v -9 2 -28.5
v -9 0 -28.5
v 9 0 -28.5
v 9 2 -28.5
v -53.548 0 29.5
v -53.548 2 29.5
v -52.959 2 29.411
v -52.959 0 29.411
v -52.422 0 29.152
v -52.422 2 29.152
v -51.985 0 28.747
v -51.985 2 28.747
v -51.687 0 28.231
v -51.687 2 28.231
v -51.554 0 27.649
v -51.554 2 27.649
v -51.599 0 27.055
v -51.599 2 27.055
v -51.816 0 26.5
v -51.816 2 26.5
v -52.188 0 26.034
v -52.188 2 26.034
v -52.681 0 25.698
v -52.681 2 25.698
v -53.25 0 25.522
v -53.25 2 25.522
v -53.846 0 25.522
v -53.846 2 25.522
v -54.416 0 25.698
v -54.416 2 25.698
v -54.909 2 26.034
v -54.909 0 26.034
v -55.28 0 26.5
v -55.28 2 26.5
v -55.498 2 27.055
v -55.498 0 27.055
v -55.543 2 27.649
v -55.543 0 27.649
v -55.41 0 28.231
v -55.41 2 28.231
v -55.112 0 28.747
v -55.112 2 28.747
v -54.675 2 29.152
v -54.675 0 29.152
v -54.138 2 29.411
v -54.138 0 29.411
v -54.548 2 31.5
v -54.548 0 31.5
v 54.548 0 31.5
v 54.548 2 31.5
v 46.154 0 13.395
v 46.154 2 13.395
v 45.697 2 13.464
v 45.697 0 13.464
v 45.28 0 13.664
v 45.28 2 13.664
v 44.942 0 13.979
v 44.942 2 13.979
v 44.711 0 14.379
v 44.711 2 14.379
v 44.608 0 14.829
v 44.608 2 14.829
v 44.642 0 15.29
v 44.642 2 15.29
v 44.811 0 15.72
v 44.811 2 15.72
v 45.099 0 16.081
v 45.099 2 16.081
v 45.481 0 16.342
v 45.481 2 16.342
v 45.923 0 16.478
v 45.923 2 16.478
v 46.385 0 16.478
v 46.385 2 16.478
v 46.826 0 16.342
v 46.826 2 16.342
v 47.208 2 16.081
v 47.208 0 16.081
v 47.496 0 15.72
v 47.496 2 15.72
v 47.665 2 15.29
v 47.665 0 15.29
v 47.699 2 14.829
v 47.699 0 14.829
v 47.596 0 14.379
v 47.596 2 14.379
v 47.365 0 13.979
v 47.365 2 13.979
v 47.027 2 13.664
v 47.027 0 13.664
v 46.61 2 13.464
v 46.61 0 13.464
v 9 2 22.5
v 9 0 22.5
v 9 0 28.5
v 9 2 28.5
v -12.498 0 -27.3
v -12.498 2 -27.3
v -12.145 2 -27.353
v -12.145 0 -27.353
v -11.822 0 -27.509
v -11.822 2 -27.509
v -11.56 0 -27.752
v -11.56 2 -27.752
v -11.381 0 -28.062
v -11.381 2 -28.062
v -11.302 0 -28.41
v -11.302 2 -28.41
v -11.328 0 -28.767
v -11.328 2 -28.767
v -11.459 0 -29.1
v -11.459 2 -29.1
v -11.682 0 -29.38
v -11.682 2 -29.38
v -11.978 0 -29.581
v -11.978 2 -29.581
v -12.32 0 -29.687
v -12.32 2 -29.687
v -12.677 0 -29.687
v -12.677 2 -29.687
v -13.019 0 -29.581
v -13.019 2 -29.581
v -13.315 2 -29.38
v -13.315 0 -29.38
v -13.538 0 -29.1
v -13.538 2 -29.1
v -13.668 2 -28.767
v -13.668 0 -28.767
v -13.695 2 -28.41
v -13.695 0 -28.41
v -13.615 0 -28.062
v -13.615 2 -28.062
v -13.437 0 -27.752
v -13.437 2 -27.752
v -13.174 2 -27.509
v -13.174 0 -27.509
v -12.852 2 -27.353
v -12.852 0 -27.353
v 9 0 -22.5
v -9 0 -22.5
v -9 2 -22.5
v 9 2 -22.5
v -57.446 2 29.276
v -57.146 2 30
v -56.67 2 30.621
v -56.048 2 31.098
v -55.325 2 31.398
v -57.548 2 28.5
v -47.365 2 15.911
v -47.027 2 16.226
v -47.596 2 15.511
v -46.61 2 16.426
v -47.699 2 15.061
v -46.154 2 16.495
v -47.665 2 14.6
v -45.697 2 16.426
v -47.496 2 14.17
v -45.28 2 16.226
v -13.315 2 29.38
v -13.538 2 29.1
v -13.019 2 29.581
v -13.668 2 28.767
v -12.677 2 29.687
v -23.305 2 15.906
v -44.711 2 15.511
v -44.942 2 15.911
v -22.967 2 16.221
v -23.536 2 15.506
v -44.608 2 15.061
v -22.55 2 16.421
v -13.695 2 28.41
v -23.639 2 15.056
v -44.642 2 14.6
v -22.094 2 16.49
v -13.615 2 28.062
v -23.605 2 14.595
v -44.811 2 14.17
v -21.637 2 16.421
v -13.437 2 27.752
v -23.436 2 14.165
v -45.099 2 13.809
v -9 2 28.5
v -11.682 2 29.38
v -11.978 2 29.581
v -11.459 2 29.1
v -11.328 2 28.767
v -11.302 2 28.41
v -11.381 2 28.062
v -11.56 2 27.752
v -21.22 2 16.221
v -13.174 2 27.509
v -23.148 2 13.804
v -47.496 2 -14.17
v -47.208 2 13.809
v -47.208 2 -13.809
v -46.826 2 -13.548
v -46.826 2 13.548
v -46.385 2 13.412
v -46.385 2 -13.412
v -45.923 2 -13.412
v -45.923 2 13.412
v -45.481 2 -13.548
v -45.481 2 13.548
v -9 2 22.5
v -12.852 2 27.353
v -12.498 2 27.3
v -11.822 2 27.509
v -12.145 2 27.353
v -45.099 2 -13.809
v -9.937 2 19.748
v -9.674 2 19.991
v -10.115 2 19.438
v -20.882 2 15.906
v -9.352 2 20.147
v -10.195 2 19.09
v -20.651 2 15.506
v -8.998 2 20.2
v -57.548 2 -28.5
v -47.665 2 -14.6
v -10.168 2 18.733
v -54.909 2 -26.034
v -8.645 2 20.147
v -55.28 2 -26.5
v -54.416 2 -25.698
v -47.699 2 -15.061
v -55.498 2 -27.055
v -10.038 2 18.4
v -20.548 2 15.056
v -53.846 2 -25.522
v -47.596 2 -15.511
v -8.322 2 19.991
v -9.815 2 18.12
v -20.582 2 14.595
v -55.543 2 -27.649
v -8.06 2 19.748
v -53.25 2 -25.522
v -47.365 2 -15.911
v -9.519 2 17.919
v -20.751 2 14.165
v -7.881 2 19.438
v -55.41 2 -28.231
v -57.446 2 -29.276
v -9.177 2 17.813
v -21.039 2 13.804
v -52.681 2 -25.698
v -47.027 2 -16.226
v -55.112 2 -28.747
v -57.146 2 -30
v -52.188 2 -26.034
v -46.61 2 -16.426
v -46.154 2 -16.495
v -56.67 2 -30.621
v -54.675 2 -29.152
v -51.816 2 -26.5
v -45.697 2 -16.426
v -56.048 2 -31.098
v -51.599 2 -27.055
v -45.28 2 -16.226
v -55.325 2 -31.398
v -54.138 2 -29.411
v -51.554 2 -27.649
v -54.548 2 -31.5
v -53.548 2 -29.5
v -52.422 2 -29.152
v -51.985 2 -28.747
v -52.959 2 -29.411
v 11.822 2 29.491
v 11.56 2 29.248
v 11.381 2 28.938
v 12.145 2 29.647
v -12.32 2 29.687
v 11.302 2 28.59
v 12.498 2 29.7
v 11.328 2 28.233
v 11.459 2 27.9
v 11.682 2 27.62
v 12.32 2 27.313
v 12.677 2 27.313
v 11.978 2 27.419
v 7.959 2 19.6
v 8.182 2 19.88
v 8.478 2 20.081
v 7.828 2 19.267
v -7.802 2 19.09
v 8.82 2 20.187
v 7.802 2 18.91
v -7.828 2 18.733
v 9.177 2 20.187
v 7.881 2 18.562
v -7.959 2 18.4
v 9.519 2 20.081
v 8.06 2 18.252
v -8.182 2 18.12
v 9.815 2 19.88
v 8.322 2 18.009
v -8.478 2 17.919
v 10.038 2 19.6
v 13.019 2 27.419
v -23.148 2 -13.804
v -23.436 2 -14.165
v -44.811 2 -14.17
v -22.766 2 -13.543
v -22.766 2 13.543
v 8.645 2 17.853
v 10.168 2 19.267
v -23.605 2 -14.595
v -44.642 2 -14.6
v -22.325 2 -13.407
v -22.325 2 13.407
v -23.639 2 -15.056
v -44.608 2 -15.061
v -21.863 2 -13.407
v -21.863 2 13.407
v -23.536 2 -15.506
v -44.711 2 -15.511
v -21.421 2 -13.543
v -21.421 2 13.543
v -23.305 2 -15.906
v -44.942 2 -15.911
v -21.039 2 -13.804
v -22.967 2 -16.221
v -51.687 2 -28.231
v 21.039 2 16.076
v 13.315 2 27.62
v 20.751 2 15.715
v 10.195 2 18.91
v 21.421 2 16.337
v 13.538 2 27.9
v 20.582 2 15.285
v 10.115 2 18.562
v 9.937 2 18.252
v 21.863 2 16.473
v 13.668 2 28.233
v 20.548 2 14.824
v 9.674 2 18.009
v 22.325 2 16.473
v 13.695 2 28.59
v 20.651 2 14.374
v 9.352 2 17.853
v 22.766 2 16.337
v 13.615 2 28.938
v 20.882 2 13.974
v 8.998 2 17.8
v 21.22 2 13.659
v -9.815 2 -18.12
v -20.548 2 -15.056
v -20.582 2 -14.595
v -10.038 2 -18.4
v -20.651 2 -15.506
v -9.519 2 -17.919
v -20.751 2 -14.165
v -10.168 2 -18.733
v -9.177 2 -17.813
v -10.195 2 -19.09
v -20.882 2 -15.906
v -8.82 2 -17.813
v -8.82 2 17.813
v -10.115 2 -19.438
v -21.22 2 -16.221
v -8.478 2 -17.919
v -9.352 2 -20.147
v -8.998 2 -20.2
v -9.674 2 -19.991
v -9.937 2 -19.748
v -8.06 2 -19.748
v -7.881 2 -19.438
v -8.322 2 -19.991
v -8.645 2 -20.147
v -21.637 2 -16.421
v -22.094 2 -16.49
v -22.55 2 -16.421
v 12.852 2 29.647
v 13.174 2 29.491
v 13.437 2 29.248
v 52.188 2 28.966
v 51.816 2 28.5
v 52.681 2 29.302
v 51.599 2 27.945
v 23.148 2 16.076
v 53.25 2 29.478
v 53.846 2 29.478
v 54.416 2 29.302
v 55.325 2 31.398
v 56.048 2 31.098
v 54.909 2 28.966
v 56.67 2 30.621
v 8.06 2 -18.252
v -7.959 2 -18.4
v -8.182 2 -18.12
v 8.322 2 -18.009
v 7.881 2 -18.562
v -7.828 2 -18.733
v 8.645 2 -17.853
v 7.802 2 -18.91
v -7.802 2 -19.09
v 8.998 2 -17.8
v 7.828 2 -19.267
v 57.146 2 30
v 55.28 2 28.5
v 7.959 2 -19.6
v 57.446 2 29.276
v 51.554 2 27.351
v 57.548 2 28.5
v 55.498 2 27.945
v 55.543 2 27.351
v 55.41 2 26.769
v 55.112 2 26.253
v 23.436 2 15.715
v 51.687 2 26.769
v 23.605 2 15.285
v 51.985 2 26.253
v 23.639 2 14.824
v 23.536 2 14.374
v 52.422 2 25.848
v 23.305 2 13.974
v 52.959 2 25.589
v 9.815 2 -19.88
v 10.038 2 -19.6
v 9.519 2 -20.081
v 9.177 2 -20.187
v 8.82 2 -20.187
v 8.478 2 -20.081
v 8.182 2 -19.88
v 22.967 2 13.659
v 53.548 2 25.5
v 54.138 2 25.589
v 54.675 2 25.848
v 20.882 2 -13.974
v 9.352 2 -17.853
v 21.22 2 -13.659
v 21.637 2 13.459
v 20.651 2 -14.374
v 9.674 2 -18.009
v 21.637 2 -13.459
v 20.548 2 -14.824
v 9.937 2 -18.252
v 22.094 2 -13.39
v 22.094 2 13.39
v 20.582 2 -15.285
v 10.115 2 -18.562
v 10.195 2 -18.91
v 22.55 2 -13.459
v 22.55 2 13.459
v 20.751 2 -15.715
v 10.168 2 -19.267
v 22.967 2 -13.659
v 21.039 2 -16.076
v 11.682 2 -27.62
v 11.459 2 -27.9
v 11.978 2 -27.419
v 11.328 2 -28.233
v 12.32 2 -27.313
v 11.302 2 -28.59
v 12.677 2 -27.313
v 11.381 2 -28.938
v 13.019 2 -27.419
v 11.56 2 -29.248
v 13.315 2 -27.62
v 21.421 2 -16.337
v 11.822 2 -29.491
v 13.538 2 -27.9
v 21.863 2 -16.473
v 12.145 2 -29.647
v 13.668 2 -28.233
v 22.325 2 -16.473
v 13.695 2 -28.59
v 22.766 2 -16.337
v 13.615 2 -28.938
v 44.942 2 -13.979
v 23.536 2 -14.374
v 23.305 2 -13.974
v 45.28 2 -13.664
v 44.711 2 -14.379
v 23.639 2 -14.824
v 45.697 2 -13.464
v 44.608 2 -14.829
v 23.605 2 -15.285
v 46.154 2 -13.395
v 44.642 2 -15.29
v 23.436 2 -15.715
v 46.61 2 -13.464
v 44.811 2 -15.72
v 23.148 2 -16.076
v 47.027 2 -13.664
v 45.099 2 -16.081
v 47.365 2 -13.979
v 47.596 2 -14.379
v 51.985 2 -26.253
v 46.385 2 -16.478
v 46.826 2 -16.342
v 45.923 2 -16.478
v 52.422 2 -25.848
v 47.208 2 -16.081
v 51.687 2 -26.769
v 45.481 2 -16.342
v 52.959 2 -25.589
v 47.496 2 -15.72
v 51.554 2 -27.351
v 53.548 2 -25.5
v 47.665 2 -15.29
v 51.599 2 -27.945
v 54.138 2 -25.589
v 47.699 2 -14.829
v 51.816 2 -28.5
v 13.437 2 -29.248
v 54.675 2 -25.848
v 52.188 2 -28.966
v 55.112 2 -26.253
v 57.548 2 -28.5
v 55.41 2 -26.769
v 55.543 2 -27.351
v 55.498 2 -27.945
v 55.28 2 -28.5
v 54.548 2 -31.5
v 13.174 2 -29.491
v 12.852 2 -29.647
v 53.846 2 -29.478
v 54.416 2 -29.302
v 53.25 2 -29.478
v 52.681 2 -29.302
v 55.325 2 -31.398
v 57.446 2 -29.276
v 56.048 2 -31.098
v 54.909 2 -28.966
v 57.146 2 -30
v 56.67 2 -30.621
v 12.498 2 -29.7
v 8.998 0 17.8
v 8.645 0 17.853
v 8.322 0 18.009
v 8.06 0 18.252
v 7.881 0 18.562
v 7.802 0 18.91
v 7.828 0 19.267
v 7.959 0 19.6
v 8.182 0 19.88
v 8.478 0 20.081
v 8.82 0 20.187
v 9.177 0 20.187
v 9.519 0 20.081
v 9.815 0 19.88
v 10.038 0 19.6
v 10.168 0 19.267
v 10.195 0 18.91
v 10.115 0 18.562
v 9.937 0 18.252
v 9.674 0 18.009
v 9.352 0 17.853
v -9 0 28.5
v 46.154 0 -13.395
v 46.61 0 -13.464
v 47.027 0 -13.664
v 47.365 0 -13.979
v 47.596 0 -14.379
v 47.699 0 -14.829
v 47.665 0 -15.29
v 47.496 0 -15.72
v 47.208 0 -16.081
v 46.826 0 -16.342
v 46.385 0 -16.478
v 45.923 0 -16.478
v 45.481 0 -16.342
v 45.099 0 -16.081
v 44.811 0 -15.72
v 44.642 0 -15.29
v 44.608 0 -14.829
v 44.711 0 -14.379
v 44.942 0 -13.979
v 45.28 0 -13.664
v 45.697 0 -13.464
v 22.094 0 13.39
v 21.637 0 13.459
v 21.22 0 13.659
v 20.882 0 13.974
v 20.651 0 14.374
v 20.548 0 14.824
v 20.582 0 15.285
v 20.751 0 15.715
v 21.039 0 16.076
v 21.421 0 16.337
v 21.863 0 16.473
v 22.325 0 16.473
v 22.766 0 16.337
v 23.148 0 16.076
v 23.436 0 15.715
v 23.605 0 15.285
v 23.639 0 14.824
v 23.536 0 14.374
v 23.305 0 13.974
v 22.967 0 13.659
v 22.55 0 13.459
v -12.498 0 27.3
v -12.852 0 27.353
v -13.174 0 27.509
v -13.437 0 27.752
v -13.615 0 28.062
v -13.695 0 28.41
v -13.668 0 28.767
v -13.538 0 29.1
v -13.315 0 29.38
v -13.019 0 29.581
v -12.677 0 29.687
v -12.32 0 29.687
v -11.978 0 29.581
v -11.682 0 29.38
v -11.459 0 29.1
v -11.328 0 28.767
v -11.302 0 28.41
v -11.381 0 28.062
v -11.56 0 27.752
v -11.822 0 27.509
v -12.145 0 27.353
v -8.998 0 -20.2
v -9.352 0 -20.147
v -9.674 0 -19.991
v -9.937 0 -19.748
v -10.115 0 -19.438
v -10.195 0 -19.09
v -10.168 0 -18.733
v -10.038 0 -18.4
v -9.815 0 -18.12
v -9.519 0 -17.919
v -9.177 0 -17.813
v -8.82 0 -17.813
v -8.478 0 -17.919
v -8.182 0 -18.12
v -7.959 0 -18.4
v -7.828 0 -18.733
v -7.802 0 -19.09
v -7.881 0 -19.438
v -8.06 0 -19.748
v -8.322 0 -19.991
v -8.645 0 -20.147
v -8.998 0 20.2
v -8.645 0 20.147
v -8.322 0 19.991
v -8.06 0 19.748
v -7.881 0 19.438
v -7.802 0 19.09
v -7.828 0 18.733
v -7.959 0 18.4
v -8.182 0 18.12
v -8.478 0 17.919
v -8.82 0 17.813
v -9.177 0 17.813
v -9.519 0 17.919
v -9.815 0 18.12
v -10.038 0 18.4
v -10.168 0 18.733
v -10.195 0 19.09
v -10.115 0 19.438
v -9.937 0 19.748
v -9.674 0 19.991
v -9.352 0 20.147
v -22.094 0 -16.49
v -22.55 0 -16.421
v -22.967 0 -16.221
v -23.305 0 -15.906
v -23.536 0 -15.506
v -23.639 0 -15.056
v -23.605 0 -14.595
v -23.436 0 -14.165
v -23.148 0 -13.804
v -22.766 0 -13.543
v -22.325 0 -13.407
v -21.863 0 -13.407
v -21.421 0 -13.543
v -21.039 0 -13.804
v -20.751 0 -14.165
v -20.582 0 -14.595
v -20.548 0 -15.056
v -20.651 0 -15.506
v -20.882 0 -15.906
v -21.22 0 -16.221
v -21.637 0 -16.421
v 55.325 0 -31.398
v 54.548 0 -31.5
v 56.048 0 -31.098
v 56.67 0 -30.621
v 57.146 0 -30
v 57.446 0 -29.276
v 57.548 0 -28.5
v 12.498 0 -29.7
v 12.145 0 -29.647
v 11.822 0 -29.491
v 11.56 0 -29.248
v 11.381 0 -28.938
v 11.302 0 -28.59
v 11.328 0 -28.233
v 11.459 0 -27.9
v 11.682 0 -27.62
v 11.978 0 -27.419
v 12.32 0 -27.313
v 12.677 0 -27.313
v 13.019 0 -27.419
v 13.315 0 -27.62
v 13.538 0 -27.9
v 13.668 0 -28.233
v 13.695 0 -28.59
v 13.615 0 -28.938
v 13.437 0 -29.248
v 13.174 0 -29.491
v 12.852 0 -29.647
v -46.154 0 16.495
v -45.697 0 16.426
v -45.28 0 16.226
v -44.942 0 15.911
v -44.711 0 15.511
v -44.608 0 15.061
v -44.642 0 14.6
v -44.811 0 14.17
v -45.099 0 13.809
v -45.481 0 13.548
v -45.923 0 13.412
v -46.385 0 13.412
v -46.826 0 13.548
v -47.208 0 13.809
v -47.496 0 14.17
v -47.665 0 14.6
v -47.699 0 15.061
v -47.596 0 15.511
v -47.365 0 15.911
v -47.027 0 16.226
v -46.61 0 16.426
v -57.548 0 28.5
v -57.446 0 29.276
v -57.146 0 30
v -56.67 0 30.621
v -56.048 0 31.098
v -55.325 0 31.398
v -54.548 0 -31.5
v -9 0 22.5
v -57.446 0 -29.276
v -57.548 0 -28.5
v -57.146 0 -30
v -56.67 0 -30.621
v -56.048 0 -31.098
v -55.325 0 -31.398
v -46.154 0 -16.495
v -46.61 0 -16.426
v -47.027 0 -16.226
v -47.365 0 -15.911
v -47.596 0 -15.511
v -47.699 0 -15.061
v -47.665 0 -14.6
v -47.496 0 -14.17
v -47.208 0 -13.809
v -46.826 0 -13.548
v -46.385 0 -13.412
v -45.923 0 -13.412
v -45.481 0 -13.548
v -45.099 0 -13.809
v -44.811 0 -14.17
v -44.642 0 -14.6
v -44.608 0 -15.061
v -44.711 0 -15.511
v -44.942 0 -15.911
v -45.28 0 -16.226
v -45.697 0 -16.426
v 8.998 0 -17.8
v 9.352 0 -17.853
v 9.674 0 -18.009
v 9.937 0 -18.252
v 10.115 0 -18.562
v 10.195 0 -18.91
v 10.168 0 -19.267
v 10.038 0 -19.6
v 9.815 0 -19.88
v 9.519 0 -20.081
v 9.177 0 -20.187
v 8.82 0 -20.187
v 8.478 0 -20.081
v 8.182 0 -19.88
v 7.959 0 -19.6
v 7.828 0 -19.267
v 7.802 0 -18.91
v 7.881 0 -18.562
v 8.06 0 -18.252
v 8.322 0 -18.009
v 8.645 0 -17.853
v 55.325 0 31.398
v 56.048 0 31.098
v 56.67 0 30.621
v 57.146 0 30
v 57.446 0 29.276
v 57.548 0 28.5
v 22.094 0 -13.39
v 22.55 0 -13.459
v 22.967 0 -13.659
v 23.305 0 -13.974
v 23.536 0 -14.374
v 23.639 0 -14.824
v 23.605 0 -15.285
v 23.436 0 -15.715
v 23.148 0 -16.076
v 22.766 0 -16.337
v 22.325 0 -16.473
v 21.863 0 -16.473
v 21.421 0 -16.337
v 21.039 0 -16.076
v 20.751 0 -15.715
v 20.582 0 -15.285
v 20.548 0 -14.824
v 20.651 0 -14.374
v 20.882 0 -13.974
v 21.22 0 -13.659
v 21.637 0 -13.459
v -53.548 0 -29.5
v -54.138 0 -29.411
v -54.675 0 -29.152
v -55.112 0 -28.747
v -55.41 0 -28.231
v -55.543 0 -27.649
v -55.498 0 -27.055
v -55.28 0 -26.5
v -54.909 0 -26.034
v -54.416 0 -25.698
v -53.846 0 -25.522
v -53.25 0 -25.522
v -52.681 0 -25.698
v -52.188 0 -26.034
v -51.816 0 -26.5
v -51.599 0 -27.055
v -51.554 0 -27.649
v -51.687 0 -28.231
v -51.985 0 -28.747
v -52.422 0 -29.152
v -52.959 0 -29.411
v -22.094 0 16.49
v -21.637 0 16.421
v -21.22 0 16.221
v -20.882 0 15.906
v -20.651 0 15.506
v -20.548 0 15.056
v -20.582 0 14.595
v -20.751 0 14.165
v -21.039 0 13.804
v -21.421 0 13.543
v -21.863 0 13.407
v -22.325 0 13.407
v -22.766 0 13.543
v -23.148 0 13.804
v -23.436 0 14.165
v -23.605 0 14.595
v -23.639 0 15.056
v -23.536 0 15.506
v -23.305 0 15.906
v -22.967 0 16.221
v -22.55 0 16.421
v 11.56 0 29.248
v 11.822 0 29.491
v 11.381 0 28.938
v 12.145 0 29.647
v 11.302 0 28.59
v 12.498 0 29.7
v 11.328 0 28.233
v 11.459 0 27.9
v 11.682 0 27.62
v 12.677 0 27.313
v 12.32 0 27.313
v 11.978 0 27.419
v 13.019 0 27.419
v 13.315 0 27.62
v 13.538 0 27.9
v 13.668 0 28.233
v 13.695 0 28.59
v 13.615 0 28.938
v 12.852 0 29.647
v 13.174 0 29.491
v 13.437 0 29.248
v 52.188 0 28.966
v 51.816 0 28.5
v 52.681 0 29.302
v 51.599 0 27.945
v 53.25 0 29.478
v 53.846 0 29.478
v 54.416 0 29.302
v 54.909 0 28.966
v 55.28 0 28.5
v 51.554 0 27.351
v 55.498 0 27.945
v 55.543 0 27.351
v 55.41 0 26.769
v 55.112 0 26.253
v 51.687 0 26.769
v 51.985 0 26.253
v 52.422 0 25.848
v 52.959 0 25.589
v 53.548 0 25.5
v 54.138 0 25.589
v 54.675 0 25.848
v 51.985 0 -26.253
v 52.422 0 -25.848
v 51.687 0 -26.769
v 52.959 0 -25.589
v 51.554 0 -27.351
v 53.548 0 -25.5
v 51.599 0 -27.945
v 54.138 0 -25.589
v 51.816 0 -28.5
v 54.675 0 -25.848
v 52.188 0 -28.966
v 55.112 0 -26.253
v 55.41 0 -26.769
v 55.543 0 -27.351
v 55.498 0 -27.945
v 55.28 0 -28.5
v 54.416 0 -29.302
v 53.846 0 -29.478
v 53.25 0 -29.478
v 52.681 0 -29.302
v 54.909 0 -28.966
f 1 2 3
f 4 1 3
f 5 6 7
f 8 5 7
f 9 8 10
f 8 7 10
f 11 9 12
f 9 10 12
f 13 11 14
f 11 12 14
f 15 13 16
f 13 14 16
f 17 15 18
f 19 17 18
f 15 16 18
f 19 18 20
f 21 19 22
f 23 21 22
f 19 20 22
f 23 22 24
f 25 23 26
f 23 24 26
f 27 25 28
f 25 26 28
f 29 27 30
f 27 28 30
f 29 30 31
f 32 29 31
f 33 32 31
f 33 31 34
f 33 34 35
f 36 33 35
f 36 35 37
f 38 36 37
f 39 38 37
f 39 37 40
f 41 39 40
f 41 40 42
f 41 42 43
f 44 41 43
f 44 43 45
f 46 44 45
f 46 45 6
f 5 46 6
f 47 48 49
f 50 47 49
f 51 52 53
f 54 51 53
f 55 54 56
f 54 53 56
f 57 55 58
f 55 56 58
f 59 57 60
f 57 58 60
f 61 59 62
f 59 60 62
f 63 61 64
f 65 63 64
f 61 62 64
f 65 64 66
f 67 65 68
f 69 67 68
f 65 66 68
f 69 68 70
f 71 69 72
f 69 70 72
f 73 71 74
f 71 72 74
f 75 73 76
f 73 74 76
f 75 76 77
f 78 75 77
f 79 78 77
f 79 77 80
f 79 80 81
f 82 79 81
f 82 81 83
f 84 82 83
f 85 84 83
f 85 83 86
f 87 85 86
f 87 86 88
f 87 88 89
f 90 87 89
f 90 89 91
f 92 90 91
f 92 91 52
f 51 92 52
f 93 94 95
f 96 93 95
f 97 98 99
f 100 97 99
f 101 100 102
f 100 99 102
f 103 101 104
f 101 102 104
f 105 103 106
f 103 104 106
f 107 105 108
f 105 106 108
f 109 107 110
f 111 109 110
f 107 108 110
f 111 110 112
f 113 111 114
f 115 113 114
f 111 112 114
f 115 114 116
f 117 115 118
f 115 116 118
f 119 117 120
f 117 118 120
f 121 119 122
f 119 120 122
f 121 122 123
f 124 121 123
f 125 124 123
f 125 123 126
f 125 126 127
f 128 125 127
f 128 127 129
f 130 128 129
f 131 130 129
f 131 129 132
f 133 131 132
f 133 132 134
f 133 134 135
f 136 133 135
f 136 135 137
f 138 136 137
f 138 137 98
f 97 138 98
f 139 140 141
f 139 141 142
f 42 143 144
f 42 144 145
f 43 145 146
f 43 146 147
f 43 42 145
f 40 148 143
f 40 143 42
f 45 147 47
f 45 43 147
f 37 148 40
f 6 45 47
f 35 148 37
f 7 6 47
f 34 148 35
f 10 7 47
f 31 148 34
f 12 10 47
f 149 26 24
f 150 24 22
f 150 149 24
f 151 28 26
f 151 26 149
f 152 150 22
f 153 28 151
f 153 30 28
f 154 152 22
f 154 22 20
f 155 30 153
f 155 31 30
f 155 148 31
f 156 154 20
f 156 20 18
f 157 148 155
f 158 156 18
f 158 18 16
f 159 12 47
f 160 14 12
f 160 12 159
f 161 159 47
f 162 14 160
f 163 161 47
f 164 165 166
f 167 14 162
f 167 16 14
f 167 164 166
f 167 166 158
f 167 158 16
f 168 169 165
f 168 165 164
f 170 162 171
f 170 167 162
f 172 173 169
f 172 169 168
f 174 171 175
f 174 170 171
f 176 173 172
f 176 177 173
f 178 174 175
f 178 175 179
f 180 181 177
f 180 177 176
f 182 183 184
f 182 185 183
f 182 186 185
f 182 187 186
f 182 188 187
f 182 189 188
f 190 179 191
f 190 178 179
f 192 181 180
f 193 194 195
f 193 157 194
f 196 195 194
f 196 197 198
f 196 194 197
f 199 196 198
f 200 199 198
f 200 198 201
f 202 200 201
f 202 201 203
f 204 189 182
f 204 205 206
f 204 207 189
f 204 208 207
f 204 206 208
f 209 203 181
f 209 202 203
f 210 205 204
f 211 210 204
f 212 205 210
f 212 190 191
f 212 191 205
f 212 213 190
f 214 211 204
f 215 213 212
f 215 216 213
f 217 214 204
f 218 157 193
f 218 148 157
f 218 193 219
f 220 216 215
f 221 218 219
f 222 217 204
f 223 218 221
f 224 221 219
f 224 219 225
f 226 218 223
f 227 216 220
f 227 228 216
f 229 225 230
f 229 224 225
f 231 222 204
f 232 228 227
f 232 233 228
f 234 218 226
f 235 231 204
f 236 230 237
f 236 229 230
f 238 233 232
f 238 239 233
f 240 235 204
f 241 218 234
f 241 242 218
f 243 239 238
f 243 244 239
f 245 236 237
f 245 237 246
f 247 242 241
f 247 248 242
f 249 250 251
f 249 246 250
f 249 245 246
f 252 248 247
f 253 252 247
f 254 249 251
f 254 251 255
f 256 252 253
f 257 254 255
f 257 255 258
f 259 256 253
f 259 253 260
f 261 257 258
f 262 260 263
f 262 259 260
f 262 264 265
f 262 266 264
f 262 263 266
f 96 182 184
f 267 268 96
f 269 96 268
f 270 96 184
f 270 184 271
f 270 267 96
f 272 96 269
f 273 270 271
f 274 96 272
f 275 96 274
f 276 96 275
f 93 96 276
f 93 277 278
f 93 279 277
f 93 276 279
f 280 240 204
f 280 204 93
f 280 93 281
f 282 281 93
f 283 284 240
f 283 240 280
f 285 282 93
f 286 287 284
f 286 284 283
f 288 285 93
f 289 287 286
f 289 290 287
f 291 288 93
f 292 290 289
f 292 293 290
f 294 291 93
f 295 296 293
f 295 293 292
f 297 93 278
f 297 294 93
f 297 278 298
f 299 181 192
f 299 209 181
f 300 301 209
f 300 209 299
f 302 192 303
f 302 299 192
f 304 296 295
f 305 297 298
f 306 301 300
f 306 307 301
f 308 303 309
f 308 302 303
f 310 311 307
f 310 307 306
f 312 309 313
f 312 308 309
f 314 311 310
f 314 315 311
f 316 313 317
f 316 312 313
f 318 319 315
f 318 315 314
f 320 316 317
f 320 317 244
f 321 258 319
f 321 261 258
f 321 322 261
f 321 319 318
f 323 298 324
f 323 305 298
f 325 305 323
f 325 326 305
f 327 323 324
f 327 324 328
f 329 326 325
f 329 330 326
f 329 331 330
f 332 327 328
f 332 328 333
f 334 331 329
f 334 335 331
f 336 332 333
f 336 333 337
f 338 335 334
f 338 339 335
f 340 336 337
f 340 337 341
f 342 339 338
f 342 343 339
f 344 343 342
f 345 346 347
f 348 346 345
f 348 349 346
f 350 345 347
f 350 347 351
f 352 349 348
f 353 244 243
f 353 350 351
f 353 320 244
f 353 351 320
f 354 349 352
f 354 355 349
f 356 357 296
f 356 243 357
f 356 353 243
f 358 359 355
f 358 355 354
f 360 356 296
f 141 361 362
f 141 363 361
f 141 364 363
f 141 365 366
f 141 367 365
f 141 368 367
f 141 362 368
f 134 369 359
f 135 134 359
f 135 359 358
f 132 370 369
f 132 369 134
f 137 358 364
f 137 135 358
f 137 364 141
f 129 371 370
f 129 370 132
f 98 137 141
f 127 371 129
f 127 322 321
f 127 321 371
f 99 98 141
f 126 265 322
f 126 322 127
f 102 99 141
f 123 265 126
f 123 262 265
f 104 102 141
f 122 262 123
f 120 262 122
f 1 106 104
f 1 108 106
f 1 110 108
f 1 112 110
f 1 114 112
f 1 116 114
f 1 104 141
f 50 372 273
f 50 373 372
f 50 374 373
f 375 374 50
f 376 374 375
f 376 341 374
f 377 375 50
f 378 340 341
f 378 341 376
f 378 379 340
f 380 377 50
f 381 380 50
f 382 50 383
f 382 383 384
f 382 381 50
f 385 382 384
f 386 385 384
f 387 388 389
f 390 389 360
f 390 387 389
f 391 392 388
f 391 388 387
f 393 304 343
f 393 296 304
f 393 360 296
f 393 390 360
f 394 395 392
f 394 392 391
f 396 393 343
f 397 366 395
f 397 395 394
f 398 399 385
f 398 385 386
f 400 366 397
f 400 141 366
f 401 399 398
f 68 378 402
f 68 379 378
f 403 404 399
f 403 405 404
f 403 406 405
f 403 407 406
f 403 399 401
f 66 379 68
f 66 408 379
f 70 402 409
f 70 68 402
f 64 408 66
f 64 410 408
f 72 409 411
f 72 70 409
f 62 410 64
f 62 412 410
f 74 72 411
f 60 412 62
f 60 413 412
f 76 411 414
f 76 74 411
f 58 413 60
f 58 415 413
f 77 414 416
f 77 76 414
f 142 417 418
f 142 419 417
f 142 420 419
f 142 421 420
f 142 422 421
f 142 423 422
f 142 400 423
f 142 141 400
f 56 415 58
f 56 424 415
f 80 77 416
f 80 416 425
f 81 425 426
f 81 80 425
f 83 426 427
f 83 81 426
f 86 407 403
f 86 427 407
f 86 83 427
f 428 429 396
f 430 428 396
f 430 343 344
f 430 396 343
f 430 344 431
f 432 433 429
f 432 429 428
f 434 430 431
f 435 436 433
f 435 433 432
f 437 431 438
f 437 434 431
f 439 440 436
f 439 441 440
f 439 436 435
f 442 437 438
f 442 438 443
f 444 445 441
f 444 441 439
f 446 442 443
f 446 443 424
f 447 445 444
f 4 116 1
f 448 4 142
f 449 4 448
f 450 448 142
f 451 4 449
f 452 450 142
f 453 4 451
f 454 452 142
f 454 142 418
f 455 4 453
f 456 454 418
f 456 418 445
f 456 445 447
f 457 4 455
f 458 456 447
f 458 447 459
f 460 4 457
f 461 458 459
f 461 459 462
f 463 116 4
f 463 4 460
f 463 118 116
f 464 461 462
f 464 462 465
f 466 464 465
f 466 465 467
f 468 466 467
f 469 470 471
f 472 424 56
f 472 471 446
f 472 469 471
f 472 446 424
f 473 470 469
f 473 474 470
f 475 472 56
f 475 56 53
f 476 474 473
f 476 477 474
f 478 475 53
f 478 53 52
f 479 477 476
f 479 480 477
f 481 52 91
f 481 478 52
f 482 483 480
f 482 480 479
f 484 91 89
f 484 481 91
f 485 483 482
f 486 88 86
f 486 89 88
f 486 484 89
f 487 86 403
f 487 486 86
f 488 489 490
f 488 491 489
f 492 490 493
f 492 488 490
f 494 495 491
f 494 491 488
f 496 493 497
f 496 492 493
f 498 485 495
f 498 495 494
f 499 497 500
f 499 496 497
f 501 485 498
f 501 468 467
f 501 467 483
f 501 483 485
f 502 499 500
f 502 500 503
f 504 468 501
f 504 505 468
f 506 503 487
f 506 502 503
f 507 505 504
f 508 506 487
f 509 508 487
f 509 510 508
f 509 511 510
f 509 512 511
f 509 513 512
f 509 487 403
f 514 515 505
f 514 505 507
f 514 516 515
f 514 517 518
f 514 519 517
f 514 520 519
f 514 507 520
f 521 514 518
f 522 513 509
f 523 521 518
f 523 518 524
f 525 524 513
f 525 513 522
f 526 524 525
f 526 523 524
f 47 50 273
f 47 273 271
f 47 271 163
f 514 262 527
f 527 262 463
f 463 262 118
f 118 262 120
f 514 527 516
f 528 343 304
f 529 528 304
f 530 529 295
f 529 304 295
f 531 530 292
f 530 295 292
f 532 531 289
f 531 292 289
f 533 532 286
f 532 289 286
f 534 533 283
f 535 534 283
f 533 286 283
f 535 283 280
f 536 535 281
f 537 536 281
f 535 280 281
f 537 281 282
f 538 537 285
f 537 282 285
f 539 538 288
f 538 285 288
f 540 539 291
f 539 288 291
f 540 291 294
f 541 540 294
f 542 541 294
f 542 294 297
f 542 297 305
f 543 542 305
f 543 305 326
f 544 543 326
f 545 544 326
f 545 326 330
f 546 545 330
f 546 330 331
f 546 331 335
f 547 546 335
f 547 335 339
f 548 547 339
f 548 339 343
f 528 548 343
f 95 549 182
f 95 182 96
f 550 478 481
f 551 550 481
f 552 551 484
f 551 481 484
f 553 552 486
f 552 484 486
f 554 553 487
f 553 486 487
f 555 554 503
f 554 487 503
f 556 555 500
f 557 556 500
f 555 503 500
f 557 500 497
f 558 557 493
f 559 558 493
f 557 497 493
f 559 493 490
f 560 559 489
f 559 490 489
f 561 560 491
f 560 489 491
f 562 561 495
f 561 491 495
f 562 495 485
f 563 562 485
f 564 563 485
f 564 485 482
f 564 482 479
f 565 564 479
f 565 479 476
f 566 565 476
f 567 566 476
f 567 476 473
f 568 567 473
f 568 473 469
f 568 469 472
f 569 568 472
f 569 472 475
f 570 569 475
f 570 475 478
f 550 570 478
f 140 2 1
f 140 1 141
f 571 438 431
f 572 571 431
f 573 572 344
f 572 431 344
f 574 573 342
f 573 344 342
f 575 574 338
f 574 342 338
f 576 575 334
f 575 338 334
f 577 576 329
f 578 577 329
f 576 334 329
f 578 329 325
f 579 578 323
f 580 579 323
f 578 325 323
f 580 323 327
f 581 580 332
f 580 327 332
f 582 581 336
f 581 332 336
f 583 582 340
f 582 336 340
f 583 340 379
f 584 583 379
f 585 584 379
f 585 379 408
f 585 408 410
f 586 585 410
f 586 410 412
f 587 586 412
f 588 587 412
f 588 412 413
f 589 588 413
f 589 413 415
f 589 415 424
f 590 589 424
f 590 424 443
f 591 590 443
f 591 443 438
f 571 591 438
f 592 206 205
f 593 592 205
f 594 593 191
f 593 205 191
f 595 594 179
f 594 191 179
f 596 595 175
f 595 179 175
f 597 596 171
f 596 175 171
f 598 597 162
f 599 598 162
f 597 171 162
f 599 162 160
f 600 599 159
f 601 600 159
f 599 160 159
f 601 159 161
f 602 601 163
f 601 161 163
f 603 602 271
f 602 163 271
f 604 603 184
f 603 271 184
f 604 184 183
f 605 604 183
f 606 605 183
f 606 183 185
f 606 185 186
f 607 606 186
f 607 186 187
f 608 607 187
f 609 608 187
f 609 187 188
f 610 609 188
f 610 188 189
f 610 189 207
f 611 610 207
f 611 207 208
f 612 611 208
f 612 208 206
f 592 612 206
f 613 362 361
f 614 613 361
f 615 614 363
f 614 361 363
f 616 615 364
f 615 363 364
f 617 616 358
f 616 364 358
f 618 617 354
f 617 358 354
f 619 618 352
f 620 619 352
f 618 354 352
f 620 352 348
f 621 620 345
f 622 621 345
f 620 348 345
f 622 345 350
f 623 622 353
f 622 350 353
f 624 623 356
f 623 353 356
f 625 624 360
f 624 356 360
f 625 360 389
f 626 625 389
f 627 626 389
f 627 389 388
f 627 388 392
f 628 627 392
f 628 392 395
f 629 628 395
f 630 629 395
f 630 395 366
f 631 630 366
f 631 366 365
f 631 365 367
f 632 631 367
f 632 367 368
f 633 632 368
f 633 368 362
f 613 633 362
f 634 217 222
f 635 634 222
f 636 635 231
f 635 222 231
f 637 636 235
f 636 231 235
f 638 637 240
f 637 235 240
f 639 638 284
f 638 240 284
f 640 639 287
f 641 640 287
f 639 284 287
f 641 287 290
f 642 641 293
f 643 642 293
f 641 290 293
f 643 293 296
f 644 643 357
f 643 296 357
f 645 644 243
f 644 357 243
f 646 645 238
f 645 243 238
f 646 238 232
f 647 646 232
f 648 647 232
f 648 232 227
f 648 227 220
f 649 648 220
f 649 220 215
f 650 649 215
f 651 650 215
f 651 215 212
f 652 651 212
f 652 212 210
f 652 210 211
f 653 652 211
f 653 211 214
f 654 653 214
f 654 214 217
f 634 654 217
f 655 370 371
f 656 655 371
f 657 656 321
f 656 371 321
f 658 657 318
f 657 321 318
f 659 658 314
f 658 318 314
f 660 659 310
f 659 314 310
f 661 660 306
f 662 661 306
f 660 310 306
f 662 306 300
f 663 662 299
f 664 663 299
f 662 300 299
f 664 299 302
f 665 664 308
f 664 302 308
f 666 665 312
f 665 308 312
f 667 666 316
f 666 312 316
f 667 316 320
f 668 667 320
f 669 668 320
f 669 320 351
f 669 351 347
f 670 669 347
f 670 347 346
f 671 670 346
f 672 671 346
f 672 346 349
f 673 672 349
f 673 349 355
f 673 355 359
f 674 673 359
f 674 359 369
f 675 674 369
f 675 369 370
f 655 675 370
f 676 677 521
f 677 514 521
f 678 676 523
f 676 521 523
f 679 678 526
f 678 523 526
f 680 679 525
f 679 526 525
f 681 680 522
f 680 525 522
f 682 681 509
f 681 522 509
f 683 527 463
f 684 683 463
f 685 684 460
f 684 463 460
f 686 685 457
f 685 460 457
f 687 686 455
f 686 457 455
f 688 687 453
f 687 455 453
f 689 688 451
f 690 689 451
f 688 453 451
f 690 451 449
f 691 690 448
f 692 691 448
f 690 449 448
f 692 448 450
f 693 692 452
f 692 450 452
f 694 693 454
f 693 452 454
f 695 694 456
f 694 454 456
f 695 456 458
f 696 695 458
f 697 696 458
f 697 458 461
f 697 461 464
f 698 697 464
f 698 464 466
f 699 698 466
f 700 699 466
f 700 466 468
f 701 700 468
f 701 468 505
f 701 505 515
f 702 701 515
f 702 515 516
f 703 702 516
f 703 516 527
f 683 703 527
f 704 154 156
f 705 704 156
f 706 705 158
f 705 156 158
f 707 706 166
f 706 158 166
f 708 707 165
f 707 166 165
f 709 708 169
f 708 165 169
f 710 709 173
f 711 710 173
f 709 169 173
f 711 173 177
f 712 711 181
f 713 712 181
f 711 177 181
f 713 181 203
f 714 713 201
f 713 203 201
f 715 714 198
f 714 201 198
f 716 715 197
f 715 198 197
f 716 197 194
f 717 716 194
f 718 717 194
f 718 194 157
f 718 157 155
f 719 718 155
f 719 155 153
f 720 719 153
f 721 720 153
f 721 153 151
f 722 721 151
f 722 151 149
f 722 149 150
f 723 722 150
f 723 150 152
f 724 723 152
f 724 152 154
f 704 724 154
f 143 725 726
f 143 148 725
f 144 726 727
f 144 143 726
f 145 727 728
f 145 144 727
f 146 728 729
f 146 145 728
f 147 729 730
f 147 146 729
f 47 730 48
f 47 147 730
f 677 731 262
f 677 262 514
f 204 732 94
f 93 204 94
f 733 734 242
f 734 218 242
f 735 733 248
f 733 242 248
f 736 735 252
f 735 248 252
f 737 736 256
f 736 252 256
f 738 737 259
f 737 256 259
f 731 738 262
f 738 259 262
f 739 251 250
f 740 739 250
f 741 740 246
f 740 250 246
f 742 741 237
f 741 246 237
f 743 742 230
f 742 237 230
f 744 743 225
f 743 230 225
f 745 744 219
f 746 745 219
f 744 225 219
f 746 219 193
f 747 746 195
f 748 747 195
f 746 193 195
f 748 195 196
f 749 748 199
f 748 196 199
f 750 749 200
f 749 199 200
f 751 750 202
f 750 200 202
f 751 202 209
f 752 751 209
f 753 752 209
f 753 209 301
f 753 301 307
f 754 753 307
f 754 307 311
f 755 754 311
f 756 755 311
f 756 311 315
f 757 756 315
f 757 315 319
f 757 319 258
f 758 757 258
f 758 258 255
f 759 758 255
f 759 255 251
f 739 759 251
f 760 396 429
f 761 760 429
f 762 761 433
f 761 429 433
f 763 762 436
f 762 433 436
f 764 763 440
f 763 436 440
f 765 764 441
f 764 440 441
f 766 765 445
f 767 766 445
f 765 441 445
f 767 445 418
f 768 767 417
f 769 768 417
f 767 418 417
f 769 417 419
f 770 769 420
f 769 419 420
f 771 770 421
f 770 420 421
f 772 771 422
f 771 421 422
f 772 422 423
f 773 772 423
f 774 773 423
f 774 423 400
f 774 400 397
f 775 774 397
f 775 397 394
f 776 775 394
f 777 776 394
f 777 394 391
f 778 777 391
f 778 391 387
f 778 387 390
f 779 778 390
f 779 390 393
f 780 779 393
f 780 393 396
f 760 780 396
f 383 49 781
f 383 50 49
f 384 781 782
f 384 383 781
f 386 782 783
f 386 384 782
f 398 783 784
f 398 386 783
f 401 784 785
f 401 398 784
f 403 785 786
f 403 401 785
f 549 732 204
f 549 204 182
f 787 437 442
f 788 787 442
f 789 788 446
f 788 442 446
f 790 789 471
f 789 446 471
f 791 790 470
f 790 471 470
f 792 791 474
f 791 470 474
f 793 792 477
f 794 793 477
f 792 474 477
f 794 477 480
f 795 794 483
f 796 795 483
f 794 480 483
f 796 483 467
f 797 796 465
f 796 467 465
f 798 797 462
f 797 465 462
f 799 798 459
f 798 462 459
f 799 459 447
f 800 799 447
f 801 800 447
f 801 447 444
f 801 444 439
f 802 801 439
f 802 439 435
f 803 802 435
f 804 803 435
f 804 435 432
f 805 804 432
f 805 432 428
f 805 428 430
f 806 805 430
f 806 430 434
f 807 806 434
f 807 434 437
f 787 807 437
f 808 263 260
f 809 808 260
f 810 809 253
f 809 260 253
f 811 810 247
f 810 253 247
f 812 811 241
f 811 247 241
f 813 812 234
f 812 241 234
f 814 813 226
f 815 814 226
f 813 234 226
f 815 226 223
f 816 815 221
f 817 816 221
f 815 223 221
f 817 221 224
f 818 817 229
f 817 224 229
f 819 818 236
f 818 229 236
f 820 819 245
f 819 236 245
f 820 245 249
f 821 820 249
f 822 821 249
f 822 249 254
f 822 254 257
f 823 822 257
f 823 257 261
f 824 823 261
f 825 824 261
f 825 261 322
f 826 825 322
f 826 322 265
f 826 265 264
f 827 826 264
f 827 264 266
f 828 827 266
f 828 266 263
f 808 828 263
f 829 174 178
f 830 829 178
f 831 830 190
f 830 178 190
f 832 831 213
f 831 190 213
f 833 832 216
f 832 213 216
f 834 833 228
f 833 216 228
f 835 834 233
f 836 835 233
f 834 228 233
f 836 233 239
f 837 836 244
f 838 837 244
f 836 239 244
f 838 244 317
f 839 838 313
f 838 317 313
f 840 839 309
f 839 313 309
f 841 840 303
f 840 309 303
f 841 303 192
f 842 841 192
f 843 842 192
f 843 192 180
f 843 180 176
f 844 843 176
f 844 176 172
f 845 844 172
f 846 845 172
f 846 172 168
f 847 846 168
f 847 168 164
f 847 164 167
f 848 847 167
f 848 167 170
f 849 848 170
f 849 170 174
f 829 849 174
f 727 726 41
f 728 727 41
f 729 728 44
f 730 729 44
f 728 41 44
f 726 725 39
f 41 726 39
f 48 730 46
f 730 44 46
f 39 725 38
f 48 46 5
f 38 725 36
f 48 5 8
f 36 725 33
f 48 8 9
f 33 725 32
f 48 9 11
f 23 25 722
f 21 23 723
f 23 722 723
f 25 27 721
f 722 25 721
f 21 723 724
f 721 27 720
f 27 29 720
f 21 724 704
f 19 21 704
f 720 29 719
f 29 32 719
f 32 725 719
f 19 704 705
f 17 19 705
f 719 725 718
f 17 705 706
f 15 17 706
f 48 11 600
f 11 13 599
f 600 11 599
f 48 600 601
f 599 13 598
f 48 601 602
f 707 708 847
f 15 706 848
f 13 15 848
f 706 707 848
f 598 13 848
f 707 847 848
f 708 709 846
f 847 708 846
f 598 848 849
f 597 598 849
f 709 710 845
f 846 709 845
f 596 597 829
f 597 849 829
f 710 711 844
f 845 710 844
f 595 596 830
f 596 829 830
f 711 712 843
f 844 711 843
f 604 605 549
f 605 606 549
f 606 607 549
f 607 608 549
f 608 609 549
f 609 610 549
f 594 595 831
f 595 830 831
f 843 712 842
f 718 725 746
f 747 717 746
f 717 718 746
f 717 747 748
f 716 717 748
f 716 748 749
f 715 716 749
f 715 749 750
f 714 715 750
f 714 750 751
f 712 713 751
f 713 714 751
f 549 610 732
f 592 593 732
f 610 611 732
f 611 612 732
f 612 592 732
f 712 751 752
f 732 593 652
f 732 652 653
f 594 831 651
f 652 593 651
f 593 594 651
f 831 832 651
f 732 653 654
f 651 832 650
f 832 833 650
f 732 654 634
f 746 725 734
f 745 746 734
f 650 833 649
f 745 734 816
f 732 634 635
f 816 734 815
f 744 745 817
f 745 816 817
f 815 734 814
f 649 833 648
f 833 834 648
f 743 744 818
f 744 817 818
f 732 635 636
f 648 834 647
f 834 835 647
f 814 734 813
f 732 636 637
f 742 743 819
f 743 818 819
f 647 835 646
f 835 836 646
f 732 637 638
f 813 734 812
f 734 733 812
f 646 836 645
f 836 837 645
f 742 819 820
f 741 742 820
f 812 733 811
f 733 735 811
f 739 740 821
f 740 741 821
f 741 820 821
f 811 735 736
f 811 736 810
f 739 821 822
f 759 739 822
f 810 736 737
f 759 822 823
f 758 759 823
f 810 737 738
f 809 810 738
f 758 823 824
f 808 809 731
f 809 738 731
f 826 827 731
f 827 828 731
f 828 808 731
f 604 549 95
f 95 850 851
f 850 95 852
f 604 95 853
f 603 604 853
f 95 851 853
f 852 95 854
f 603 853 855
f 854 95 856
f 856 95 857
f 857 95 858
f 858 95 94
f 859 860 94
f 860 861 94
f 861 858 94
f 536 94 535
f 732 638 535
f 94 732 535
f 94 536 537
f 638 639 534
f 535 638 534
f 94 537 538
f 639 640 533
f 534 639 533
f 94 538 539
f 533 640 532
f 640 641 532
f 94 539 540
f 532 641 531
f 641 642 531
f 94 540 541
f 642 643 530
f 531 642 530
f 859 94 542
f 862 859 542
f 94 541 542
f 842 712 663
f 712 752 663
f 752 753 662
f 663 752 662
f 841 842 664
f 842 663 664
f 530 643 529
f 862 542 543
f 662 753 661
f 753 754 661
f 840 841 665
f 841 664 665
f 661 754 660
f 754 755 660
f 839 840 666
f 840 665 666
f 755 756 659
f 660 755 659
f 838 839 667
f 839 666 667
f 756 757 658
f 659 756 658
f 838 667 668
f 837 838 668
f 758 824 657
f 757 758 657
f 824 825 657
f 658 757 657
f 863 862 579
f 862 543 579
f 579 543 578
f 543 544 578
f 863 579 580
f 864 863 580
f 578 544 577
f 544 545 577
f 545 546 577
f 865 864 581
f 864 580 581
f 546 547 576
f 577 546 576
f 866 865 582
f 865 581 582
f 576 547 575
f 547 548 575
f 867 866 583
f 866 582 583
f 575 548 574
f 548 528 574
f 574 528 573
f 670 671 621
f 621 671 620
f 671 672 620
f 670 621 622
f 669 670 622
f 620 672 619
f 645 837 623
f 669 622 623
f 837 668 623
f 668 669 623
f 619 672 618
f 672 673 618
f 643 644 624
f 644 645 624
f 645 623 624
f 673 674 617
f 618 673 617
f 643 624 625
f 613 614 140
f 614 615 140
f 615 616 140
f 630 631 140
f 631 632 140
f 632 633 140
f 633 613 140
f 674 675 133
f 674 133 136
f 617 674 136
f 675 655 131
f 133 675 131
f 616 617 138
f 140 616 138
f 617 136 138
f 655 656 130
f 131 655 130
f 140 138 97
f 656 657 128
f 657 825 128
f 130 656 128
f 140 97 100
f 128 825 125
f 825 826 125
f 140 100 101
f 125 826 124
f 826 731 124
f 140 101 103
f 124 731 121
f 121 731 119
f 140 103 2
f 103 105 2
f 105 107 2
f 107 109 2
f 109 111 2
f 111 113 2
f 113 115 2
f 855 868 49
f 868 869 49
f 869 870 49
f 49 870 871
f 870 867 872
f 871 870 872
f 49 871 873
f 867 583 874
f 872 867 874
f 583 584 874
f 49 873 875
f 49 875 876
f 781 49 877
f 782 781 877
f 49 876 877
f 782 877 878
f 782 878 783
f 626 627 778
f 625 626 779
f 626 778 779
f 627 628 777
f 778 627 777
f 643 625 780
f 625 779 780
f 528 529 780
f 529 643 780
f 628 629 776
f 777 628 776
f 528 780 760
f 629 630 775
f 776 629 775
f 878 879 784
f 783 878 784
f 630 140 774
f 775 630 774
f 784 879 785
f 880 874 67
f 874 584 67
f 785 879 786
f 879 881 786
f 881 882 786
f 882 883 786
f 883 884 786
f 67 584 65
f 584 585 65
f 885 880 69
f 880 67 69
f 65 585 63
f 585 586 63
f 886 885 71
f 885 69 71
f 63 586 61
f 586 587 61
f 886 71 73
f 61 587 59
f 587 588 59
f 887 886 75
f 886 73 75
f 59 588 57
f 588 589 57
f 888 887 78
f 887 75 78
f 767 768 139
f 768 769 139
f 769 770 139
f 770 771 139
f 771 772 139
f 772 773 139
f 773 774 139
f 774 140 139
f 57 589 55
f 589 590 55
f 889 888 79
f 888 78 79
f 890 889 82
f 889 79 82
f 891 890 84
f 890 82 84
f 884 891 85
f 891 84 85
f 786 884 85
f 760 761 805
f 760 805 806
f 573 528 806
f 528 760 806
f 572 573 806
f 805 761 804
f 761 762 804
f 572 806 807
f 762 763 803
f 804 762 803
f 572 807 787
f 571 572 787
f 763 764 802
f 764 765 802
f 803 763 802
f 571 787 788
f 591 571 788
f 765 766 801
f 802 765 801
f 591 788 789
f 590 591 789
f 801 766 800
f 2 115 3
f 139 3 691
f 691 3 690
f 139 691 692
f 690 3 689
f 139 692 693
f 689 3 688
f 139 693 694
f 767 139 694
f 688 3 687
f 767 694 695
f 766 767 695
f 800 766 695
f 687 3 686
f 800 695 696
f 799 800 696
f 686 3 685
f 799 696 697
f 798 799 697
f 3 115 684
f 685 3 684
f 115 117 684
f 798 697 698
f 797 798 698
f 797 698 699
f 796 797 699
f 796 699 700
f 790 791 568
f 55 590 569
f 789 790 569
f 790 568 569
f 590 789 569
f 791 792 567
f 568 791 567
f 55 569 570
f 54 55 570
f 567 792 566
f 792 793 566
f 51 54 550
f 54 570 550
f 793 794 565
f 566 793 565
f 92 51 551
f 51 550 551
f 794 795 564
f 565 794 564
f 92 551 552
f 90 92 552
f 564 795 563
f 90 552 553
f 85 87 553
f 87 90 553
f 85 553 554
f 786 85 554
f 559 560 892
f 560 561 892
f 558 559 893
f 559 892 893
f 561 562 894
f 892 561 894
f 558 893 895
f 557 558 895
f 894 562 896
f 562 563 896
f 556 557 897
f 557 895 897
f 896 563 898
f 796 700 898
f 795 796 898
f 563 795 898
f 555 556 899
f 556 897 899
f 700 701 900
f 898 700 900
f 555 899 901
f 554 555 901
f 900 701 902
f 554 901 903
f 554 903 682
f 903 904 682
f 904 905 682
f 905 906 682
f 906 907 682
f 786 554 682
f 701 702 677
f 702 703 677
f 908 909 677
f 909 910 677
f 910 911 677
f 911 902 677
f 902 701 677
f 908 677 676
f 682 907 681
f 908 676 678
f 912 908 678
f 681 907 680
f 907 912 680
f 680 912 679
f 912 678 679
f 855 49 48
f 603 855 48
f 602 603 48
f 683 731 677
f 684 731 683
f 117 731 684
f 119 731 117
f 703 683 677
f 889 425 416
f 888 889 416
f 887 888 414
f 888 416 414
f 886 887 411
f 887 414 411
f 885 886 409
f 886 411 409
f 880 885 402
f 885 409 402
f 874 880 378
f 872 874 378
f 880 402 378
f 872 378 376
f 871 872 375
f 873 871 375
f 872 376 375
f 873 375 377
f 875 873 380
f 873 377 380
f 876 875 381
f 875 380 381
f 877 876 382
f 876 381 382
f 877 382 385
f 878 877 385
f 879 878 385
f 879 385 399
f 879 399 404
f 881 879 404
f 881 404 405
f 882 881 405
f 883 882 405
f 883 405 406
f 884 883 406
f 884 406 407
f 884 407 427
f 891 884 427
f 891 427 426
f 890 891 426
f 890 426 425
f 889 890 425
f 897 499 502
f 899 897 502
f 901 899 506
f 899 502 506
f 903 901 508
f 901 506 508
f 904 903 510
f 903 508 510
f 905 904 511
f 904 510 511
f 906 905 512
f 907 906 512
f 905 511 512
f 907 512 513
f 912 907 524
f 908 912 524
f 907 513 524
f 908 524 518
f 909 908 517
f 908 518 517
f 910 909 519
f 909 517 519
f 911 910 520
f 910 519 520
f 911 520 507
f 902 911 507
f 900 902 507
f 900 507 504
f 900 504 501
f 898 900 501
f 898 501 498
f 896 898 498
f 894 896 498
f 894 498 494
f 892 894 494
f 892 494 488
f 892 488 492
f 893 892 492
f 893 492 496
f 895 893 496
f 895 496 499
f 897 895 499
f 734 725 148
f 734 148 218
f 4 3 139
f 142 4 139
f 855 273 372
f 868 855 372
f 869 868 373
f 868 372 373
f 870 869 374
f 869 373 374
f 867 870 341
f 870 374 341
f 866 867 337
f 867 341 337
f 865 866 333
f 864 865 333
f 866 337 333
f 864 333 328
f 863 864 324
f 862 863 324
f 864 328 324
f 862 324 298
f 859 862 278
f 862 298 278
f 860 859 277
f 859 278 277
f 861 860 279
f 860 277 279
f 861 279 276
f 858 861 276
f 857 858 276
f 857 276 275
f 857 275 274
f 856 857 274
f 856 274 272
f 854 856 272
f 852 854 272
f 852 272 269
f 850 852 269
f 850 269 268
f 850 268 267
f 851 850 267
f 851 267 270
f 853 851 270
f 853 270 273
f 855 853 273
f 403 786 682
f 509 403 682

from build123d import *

# Parameters (mm, degrees)
ESBO_O1_W                = 115.09677689
ESBO_O1_H                = 63
RESSALTO_EXTRUS_O1_DEPTH = 2
ESBO_O2_R                = 1.55
CORTE_EXTRUS_O1_DEPTH    = 66.635866816
ESBO_O3_W                = 18
ESBO_O3_H                = 6
CORTE_EXTRUS_O2_DEPTH    = 66.635866816
ESBO_O5_R                = 2
CORTE_EXTRUS_O3_DEPTH    = 66.635866816
FILETE1_R                = 3
ESBO_O8_R                = 1.2
CORTE_EXTRUS_O4_DEPTH    = 66.635866816


with BuildPart() as part:
    # Esboço1 → Ressalto-extrusão1 (new body)
    with BuildSketch(Plane(origin=(0, 0, 0), x_dir=(1, 0, 0), z_dir=(0, 1, 0))):
        Rectangle(ESBO_O1_W, ESBO_O1_H)
    extrude(amount=RESSALTO_EXTRUS_O1_DEPTH)

    # Esboço2 → Corte-extrusão1 (cut, through all)
    with BuildSketch(Plane(origin=(0, 2, 0), x_dir=(1, 0, 0), z_dir=(0, 1, 0))):
        with Locations(Location((-46.153556516, -14.945, 0), (0, 0, 270))):
            Circle(ESBO_O2_R)
        with Locations(Location((-22.093556516, -14.94, 0), (0, 0, 270))):
            Circle(ESBO_O2_R)
        with Locations(Location((22.093556516, -14.94, 0), (0, 0, 90))):
            Circle(ESBO_O2_R)
        with Locations(Location((46.153556516, -14.945, 0), (0, 0, 90))):
            Circle(ESBO_O2_R)
        with Locations(Location((46.153556516, 14.945, 0), (0, 0, 270))):
            Circle(ESBO_O2_R)
        with Locations(Location((22.093556516, 14.94, 0), (0, 0, 270))):
            Circle(ESBO_O2_R)
        with Locations(Location((-22.093556516, 14.94, 0), (0, 0, 90))):
            Circle(ESBO_O2_R)
        with Locations(Location((-46.153556516, 14.945, 0), (0, 0, 90))):
            Circle(ESBO_O2_R)
    extrude(amount=-CORTE_EXTRUS_O1_DEPTH, mode=Mode.SUBTRACT)

    # Esboço3 → Corte-extrusão2 (cut, through all)
    with BuildSketch(Plane.XZ):
        with Locations((0, 25.5)):
            Rectangle(ESBO_O3_W, ESBO_O3_H)
        with Locations((0, -25.5)):
            Rectangle(ESBO_O3_W, ESBO_O3_H)
    extrude(amount=-CORTE_EXTRUS_O2_DEPTH, mode=Mode.SUBTRACT)

    # Esboço5 → Corte-extrusão3 (cut, through all)
    with BuildSketch(Plane(origin=(0, 2, 0), x_dir=(1, 0, 0), z_dir=(0, 1, 0))):
        with Locations(Location((53.548388445, 27.5, 0), (0, 0, 270))):
            Circle(ESBO_O5_R)
        with Locations(Location((53.548388445, -27.5, 0), (0, 0, 90))):
            Circle(ESBO_O5_R)
        with Locations(Location((-53.548388445, -27.5, 0), (0, 0, 270))):
            Circle(ESBO_O5_R)
        with Locations(Location((-53.548388445, 27.5, 0), (0, 0, 90))):
            Circle(ESBO_O5_R)
    extrude(amount=-CORTE_EXTRUS_O3_DEPTH, mode=Mode.SUBTRACT)

    # Filete1
    filete1_edges = [part.edges().sort_by_distance(p)[0] for p in [
        (-57.548388445, 1, -31.5),
        (57.548388445, 1, -31.5),
        (57.548388445, 1, 31.5),
        (-57.548388445, 1, 31.5),
    ]]
    fillet(filete1_edges, radius=FILETE1_R)

    # Esboço8 → Corte-extrusão4 (cut, through all)
    with BuildSketch(Plane(origin=(0, 2, 0), x_dir=(1, 0, 0), z_dir=(0, 1, 0))):
        with Locations(Location((-12.498388445, 28.5, 0), (0, 0, 270))):
            Circle(ESBO_O8_R)
        with Locations(Location((12.498388445, 28.5, 0), (0, 0, 90))):
            Circle(ESBO_O8_R)
        with Locations(Location((12.498388445, -28.5, 0), (0, 0, 270))):
            Circle(ESBO_O8_R)
        with Locations(Location((-12.498388445, -28.5, 0), (0, 0, 90))):
            Circle(ESBO_O8_R)
        with Locations(Location((-8.998388445, -19, 0), (0, 0, 270))):
            Circle(ESBO_O8_R)
        with Locations(Location((8.998388445, -19, 0), (0, 0, 90))):
            Circle(ESBO_O8_R)
        with Locations(Location((8.998388445, 19, 0), (0, 0, 270))):
            Circle(ESBO_O8_R)
        with Locations(Location((-8.998388445, 19, 0), (0, 0, 90))):
            Circle(ESBO_O8_R)
    extrude(amount=-CORTE_EXTRUS_O4_DEPTH, mode=Mode.SUBTRACT)


solid = part.part
